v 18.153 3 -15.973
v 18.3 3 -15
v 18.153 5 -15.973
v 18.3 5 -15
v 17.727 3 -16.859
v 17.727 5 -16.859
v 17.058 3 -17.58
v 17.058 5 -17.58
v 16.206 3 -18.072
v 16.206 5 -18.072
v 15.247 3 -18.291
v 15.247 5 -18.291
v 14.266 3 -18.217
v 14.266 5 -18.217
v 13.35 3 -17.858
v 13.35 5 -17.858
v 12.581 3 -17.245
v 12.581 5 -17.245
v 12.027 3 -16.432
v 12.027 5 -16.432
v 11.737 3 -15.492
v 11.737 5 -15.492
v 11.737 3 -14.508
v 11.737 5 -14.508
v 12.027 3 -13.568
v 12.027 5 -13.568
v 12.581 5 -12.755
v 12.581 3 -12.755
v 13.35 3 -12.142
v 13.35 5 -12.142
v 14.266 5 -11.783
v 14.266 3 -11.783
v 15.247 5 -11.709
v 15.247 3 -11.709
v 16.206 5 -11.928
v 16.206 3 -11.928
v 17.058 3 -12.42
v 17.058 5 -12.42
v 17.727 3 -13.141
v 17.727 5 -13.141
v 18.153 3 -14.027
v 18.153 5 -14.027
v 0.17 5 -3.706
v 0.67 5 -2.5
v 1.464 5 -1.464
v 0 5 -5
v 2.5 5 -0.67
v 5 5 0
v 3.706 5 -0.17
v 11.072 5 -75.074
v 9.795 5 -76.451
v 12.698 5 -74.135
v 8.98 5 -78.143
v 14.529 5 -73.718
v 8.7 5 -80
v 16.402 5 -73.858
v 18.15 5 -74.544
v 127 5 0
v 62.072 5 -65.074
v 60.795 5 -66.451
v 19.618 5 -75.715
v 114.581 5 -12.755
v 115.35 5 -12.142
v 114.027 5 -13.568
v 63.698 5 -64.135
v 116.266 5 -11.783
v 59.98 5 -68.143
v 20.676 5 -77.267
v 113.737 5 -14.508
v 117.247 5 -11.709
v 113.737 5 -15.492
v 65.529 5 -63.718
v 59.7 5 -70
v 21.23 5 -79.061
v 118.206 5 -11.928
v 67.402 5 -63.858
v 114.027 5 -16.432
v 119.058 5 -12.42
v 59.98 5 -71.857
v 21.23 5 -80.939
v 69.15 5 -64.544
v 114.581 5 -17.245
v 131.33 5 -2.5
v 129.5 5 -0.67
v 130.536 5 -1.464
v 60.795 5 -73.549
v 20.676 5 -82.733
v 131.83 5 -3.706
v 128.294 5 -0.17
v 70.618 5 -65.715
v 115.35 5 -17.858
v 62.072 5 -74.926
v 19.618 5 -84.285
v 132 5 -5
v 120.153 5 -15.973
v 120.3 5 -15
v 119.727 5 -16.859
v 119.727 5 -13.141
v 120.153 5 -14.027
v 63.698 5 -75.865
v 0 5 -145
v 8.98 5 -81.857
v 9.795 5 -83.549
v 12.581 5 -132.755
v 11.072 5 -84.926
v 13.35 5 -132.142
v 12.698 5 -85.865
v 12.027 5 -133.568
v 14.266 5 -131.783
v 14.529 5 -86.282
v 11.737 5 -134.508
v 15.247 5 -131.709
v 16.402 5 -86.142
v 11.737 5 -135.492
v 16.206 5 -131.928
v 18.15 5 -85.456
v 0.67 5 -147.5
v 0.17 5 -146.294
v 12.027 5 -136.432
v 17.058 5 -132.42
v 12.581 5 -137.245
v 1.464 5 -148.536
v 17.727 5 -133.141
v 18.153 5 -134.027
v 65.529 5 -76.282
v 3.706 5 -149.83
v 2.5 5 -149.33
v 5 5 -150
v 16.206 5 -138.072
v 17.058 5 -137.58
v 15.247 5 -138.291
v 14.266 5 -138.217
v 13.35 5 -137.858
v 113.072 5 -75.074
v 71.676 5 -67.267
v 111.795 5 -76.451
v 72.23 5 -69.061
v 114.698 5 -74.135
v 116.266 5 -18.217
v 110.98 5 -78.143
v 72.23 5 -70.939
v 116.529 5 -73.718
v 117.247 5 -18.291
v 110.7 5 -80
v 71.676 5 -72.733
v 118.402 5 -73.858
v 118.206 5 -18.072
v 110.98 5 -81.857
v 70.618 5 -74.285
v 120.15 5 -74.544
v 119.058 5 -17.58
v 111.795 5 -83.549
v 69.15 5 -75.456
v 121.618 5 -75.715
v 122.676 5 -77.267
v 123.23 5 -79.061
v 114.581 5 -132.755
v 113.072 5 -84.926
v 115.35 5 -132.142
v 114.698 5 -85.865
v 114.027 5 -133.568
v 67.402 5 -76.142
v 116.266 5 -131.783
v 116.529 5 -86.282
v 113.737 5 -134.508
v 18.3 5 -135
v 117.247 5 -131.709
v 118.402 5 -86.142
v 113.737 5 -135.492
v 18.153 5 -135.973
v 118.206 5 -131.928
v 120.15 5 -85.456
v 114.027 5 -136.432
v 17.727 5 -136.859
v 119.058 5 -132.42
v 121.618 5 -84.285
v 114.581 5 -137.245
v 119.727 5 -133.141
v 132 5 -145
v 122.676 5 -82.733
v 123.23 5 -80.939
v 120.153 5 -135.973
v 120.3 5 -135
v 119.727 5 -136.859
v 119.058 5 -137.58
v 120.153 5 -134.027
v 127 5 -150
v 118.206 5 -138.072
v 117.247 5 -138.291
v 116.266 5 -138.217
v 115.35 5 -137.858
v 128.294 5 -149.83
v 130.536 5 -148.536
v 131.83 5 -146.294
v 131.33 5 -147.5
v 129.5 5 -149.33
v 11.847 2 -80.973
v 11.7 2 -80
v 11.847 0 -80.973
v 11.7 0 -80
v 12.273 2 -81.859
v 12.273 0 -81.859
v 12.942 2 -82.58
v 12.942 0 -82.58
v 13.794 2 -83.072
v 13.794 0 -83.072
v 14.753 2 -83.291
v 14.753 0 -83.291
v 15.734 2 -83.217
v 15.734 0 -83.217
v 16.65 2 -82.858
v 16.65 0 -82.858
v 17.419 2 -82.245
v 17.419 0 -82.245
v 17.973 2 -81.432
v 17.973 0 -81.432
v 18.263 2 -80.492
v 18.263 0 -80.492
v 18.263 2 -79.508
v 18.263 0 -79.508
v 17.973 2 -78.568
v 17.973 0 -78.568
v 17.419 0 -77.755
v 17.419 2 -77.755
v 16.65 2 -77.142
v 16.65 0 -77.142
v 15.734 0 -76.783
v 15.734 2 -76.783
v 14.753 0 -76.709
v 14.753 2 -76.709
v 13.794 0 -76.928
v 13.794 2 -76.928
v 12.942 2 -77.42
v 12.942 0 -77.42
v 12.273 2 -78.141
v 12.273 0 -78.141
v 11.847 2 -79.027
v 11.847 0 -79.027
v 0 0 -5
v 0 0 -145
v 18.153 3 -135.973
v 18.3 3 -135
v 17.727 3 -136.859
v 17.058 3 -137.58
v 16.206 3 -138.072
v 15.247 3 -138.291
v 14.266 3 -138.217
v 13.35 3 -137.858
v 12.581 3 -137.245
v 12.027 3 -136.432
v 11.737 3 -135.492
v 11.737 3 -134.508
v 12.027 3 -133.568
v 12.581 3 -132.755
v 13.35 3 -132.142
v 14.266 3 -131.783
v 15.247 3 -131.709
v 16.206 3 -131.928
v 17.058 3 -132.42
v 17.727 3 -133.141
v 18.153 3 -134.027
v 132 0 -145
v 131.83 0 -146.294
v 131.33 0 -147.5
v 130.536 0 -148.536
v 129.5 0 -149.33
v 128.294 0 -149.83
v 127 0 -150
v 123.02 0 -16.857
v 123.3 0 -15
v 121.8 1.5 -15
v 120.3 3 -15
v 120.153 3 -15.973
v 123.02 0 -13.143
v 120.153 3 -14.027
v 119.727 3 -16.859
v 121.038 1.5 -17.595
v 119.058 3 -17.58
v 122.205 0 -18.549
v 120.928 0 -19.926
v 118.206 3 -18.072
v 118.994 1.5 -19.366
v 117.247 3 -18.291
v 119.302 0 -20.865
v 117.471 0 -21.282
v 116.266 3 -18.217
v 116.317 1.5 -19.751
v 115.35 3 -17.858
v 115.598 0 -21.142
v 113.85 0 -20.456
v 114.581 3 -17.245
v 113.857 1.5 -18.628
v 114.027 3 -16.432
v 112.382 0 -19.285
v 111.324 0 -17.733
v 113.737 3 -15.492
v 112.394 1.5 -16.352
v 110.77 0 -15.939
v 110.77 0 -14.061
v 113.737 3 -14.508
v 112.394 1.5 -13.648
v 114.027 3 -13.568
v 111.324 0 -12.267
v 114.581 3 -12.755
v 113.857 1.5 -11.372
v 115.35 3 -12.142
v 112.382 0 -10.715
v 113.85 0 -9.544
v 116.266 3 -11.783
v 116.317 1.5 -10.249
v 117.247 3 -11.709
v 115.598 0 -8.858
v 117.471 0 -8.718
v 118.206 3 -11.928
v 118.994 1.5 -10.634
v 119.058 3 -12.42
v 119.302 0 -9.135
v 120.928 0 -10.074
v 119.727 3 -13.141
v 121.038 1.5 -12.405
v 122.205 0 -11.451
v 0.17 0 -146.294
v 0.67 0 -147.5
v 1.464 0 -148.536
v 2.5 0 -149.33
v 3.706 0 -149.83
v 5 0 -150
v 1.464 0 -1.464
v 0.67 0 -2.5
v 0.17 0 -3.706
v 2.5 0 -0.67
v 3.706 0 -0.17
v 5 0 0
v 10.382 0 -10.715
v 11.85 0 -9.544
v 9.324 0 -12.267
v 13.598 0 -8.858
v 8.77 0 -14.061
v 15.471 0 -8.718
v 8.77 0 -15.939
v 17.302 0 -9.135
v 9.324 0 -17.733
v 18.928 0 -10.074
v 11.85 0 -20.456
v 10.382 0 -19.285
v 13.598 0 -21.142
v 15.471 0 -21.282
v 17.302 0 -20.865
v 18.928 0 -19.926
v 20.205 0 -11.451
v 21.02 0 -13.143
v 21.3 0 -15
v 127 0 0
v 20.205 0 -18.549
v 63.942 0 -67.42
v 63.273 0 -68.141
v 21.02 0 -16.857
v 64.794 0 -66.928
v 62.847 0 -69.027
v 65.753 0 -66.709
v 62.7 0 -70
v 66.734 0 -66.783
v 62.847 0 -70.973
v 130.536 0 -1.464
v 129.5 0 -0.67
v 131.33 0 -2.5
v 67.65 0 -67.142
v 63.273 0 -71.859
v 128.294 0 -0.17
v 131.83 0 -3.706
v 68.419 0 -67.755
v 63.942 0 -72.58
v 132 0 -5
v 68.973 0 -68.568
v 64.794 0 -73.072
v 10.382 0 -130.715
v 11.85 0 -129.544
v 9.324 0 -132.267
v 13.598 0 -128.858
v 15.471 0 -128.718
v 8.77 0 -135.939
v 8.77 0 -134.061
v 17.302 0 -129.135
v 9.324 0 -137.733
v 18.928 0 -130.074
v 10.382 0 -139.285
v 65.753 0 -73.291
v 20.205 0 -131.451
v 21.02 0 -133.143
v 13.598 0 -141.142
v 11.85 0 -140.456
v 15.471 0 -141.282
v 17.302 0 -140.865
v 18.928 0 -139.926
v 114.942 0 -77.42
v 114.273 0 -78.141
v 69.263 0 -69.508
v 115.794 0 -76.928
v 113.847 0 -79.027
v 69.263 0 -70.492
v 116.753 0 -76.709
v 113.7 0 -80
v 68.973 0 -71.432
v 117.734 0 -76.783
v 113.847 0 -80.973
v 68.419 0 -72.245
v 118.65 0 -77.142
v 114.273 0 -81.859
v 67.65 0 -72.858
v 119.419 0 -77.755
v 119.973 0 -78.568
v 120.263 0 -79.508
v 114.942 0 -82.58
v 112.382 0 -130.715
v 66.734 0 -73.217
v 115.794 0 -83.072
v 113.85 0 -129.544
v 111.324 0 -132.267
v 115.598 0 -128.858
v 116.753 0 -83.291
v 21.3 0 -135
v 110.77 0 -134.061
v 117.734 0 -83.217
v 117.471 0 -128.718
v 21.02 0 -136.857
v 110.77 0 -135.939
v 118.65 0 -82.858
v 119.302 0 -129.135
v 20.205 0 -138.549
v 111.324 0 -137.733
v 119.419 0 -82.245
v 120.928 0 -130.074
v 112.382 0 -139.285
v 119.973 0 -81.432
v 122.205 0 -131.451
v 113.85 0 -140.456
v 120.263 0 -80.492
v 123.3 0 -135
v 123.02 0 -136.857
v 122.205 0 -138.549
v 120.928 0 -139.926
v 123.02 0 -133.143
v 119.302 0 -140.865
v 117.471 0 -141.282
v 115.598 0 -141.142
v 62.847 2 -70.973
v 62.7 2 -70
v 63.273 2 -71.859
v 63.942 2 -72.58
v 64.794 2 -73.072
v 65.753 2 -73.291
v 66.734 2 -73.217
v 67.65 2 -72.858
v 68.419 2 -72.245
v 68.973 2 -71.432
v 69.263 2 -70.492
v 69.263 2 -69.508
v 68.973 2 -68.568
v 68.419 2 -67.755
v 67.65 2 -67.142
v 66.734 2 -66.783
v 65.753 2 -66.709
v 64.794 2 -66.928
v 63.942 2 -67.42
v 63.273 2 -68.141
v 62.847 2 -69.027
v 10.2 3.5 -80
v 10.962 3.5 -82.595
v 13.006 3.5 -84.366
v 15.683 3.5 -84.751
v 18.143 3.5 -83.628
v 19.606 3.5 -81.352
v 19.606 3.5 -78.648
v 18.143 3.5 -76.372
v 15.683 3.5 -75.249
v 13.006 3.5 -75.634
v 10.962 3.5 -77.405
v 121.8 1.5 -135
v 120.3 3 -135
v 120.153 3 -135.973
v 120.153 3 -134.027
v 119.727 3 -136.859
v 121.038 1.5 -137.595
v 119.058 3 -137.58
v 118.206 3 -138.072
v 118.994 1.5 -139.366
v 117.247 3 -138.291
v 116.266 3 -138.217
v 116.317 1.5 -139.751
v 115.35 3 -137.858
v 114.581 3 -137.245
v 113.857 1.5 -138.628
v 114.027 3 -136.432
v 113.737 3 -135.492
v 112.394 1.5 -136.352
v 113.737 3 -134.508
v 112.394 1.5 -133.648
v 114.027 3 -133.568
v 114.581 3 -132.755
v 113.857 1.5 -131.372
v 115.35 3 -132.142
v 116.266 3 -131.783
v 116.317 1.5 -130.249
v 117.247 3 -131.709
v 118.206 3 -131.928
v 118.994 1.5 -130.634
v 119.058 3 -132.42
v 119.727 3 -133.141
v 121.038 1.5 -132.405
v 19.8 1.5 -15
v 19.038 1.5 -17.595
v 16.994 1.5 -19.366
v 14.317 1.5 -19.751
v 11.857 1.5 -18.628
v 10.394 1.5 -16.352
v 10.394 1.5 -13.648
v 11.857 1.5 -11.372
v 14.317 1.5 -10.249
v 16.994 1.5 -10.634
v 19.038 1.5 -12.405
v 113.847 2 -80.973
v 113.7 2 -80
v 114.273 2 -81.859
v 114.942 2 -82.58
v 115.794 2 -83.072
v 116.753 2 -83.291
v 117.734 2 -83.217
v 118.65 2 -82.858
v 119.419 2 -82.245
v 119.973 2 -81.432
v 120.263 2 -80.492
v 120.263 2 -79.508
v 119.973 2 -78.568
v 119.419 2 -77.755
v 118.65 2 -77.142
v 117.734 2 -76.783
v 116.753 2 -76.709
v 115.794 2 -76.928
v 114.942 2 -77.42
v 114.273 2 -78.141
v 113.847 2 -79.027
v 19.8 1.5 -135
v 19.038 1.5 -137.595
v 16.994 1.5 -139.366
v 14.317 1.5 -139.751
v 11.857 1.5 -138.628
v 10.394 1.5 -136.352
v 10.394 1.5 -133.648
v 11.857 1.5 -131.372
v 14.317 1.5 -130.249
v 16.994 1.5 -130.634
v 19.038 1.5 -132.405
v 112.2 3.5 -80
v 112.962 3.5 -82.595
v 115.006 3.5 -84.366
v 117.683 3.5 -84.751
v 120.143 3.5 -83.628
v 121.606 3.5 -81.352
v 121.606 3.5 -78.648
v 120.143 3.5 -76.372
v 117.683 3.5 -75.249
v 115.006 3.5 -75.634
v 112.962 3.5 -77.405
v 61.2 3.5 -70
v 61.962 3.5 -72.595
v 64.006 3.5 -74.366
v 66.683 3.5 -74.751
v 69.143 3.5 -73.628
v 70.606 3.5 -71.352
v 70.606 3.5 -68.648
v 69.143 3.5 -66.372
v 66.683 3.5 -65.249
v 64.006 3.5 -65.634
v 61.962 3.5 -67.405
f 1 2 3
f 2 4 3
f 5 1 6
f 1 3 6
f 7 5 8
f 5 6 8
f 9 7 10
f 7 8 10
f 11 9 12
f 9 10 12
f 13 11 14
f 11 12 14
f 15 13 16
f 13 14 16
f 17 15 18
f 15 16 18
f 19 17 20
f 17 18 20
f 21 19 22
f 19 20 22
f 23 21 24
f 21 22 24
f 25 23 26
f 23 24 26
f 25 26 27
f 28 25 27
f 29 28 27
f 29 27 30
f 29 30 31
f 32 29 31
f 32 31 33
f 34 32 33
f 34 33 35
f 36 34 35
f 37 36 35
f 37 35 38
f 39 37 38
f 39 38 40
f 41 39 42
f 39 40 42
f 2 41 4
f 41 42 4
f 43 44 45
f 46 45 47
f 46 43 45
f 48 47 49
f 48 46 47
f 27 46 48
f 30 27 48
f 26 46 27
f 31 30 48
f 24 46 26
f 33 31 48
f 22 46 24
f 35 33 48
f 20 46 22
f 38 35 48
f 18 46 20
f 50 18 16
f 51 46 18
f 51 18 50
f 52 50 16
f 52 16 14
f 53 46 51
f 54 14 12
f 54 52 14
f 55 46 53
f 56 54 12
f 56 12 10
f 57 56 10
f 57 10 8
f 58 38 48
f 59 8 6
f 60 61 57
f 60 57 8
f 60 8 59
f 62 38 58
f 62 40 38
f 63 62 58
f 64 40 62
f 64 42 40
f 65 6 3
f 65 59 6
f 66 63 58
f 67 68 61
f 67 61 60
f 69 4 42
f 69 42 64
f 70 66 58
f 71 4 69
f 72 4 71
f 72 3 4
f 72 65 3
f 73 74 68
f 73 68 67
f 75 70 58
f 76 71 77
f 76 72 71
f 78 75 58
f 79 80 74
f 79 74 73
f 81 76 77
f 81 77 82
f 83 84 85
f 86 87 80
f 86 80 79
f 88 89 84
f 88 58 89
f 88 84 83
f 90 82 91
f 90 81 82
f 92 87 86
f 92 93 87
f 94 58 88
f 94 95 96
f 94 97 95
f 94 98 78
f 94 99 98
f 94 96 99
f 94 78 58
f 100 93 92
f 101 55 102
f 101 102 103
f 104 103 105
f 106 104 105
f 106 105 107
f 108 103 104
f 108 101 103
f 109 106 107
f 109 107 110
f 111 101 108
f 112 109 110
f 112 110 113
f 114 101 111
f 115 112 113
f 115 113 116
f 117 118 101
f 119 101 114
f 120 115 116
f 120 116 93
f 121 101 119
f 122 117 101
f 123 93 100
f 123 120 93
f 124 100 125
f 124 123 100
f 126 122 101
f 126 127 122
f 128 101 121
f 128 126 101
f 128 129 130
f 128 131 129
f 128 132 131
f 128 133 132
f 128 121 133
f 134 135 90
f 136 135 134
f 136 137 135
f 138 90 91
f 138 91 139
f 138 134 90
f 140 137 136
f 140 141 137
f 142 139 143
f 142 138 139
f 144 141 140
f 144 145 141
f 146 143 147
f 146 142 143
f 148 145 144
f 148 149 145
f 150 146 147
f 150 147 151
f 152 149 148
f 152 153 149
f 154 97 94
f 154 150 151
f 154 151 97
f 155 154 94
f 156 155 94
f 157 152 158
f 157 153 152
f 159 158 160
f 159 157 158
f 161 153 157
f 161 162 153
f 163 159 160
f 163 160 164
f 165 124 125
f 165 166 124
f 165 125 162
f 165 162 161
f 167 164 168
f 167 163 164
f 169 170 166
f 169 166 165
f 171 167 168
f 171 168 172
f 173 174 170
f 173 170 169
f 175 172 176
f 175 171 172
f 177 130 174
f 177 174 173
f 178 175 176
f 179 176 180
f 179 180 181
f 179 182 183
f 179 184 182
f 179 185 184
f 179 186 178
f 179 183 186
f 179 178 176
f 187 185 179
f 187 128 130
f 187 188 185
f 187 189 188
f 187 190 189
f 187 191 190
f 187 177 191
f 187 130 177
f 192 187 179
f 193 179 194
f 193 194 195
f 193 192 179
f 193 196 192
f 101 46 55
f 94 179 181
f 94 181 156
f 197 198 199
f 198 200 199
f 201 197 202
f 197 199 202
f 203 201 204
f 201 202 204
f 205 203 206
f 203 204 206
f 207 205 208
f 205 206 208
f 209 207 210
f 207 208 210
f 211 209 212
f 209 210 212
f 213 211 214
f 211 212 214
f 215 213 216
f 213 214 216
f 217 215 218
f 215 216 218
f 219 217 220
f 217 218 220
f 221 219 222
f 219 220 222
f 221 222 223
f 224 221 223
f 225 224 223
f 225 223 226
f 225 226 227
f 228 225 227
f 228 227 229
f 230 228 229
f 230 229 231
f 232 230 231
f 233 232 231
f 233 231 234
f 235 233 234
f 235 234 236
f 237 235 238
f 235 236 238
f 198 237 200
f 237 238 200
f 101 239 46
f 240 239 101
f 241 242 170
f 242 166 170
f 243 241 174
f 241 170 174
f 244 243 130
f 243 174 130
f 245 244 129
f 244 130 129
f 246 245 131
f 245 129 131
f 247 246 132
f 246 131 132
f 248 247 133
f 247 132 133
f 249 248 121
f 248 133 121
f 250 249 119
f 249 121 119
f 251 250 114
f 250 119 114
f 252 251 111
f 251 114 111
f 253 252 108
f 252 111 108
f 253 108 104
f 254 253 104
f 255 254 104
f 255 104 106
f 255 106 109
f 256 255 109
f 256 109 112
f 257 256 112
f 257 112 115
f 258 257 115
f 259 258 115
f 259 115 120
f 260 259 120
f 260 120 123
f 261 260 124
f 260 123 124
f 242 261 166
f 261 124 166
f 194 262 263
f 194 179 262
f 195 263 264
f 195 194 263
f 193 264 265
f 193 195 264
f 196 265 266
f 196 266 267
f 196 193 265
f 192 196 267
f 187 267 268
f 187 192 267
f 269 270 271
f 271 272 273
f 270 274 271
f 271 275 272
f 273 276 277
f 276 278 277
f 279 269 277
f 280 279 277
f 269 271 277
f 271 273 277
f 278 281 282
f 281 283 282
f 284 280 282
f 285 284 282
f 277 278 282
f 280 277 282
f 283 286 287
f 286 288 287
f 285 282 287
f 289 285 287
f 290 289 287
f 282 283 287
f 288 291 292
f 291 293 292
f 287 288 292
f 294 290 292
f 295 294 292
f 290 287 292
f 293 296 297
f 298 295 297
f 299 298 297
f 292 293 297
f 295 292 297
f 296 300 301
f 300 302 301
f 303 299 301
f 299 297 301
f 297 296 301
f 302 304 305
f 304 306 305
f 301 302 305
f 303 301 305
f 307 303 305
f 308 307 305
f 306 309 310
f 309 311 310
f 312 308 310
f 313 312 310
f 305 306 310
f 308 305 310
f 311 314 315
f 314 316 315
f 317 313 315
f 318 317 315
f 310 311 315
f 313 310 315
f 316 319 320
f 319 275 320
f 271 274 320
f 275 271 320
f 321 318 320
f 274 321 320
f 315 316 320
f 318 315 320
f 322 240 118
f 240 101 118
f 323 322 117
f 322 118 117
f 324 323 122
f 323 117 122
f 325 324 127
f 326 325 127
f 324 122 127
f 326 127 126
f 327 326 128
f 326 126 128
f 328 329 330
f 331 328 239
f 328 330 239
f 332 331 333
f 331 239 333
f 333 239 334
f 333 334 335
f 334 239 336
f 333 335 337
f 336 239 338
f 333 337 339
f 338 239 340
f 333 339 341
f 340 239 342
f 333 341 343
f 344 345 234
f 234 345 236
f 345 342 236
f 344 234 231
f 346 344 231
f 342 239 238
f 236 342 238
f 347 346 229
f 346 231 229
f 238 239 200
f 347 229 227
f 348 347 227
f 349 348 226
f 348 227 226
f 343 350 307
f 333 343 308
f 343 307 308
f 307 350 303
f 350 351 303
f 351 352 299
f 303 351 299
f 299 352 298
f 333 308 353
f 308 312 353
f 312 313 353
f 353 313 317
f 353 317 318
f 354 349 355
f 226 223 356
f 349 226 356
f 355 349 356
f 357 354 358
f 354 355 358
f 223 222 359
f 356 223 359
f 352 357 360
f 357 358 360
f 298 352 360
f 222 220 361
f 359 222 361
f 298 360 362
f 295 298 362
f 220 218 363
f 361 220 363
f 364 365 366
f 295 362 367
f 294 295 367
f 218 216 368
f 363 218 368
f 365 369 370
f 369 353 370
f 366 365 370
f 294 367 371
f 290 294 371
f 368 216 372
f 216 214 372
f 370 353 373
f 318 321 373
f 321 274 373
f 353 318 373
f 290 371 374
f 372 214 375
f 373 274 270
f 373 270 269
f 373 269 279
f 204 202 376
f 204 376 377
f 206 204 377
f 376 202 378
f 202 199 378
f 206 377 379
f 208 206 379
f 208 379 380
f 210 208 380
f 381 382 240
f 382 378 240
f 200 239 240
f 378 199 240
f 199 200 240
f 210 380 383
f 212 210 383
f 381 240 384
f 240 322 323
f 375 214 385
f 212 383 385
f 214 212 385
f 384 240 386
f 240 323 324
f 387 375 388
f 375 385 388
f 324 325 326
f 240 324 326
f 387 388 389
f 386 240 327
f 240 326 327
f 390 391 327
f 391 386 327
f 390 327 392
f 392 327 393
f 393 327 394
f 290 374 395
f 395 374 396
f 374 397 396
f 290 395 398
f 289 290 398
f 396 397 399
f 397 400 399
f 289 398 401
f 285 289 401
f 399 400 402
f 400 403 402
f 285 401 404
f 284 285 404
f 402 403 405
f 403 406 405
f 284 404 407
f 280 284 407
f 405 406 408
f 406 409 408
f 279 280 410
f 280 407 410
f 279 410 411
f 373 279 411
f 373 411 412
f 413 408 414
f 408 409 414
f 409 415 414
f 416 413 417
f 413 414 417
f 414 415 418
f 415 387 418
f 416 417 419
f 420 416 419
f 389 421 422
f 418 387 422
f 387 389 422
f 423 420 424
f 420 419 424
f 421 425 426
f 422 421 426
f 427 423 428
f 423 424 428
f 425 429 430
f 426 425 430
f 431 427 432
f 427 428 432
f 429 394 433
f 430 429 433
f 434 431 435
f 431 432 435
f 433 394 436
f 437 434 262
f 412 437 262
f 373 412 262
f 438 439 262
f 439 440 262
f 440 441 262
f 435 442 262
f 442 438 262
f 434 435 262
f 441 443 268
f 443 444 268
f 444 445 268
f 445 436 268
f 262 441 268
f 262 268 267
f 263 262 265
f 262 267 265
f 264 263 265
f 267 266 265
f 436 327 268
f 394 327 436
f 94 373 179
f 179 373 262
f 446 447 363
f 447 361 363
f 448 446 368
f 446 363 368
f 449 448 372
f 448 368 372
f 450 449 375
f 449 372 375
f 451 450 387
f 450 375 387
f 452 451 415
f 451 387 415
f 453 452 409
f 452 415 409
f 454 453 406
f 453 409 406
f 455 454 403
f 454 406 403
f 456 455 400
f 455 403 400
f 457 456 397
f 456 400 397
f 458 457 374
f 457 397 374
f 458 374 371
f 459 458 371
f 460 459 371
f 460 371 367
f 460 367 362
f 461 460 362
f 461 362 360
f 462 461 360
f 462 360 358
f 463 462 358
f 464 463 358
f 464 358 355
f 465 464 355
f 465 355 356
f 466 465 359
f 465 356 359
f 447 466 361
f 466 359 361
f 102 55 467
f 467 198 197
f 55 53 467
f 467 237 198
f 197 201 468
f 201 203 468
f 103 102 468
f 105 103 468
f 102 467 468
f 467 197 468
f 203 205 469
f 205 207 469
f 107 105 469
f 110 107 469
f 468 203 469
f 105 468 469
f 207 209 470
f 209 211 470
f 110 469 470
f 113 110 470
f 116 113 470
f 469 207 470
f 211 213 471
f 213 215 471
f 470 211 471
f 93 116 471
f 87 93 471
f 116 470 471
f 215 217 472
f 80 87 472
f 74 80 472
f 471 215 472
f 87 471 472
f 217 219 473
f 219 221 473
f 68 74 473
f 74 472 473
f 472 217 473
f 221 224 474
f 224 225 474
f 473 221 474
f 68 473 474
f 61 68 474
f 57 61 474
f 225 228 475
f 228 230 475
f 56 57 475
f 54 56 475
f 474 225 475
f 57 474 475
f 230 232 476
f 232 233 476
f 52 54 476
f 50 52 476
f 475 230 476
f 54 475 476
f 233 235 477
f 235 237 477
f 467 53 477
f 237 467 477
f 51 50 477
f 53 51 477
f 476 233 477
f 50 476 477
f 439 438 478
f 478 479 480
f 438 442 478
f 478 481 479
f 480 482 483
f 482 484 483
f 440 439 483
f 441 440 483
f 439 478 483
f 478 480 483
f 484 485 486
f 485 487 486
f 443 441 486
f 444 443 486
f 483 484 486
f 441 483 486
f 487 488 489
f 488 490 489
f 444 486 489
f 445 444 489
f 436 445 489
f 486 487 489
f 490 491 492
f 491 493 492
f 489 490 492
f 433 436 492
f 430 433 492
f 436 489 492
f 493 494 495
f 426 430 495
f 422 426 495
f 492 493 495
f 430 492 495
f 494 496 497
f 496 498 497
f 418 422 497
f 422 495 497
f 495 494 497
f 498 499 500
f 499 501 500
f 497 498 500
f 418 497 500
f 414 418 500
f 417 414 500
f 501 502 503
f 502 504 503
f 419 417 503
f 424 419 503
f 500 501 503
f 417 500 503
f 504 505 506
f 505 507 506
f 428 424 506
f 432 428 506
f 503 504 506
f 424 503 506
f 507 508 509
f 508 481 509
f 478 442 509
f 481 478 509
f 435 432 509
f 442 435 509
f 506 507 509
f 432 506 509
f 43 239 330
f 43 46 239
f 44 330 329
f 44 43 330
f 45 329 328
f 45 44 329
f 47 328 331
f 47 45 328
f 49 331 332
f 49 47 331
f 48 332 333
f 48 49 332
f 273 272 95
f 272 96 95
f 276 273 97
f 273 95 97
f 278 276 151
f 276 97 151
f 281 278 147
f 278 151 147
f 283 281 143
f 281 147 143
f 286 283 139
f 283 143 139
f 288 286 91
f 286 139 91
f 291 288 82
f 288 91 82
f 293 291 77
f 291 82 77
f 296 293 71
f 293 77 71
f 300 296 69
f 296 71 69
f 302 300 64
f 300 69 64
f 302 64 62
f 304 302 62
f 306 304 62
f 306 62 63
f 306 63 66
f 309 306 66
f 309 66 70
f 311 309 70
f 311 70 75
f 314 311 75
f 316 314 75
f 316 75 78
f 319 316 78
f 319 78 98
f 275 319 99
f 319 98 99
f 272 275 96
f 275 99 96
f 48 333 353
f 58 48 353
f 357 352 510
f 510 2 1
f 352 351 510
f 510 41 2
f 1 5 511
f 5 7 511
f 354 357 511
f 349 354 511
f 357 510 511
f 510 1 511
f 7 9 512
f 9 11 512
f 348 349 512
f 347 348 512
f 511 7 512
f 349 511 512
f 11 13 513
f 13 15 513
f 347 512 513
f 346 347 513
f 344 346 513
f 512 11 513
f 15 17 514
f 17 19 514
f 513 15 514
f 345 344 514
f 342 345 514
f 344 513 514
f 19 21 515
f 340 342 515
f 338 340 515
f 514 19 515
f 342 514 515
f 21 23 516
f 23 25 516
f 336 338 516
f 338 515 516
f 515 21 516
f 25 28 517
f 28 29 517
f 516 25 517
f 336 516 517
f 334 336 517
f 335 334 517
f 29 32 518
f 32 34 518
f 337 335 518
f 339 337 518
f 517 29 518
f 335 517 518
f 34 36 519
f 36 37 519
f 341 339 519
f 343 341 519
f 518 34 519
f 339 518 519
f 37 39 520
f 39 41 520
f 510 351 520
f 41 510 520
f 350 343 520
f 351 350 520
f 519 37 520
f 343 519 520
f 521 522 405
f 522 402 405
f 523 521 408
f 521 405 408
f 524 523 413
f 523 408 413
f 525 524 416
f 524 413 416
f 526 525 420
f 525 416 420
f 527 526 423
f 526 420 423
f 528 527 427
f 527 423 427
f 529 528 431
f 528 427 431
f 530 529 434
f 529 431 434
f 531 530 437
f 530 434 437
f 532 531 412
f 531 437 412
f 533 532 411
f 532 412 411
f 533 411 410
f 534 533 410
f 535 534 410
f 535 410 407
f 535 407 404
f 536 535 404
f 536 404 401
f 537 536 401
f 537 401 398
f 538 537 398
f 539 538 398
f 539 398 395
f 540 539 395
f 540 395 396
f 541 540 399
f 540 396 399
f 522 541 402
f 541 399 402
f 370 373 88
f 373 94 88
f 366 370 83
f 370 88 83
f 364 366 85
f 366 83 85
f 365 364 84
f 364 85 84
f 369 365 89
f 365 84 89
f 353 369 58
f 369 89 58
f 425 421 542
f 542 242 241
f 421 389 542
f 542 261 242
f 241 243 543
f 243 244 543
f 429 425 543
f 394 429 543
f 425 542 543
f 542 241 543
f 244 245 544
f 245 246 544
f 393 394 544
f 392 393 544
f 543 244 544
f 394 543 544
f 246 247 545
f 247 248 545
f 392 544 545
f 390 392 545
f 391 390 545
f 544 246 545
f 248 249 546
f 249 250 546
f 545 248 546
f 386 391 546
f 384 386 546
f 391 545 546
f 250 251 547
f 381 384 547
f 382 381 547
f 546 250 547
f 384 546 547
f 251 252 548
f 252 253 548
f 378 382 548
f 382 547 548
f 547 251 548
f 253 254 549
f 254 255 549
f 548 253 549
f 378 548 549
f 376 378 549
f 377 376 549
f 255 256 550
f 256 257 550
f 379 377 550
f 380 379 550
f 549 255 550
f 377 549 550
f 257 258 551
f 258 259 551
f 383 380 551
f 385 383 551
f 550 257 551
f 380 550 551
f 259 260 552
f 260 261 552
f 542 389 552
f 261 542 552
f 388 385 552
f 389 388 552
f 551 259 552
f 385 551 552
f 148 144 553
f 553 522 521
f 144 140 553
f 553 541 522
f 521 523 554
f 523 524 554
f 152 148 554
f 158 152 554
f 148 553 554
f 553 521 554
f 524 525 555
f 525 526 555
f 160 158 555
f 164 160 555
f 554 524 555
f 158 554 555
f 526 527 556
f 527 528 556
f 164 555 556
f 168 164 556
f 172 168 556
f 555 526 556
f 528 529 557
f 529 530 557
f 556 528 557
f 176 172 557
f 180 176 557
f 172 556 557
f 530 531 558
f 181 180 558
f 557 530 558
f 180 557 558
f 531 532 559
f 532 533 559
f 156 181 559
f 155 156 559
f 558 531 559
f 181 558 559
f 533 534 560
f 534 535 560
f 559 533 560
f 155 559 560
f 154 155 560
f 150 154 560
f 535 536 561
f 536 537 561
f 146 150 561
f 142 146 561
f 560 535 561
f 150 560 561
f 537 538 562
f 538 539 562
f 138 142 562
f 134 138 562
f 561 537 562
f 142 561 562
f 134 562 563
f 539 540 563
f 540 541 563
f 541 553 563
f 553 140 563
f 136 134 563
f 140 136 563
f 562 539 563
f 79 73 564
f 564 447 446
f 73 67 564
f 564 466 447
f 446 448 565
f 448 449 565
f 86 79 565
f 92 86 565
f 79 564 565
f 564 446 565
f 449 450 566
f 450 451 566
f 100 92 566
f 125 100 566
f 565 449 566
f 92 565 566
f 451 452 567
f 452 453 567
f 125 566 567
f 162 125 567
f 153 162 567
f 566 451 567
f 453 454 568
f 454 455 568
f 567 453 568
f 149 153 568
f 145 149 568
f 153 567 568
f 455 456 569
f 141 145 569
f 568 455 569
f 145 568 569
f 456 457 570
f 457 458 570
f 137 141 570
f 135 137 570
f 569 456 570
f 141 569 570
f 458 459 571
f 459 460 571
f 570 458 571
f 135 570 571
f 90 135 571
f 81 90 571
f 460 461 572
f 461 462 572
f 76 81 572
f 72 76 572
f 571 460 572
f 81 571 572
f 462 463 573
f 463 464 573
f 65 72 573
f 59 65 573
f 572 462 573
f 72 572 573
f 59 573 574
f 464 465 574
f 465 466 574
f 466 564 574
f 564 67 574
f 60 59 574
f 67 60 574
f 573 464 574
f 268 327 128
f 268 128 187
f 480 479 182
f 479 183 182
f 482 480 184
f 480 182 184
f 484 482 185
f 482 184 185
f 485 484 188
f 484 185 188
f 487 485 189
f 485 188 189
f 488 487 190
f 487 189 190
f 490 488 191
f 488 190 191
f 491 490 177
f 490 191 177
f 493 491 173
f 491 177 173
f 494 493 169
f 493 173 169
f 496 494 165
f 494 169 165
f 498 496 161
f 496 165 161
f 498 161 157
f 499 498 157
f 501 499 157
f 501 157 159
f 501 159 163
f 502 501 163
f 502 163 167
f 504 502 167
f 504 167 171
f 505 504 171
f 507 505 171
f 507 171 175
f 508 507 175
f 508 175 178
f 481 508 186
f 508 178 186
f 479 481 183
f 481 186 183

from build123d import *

# Parameters (mm, degrees)
SKETCH1_W                                       = 132
SKETCH1_H                                       = 150
BOSS_EXTRUDE1_DEPTH                             = 5
CSK_FOR_M6_FLAT_HEAD_MACHINE_SCREW1_D           = 6.6
CSK_FOR_M6_FLAT_HEAD_MACHINE_SCREW1_DEPTH       = 10
CSK_FOR_M6_FLAT_HEAD_MACHINE_SCREW1_CSINK_D     = 12.6
CSK_FOR_M6_FLAT_HEAD_MACHINE_SCREW1_CSINK_ANGLE = 90
CSK_FOR_M6_FLAT_HEAD_MACHINE_SCREW1_TIP         = 1.982840043
CSK_FOR_M6_FLAT_HEAD_MACHINE_SCREW2_D           = 6.6
CSK_FOR_M6_FLAT_HEAD_MACHINE_SCREW2_DEPTH       = 10
CSK_FOR_M6_FLAT_HEAD_MACHINE_SCREW2_CSINK_D     = 12.6
CSK_FOR_M6_FLAT_HEAD_MACHINE_SCREW2_CSINK_ANGLE = 90
CSK_FOR_M6_FLAT_HEAD_MACHINE_SCREW2_TIP         = 1.982840043
FILLET1_R                                       = 5


with BuildPart() as part:
    # Sketch1 → Boss-Extrude1 (new body)
    with BuildSketch(Plane(origin=(0, 0, 0), x_dir=(1, 0, 0), z_dir=(0, 1, 0))):
        with Locations((66, 75)):
            Rectangle(SKETCH1_W, SKETCH1_H)
    extrude(amount=BOSS_EXTRUDE1_DEPTH)

    # CSK for M6 Flat Head Machine Screw1
    with Locations(Plane(origin=(0, 5, 0), x_dir=(1, 0, 0), z_dir=(0, 1, 0))):
        with Locations((15, 80), (66, 70), (117, 80)):
            CounterSinkHole(CSK_FOR_M6_FLAT_HEAD_MACHINE_SCREW1_D / 2, CSK_FOR_M6_FLAT_HEAD_MACHINE_SCREW1_CSINK_D / 2, depth=CSK_FOR_M6_FLAT_HEAD_MACHINE_SCREW1_DEPTH, counter_sink_angle=CSK_FOR_M6_FLAT_HEAD_MACHINE_SCREW1_CSINK_ANGLE)
            with Locations((0, 0, -(CSK_FOR_M6_FLAT_HEAD_MACHINE_SCREW1_DEPTH + CSK_FOR_M6_FLAT_HEAD_MACHINE_SCREW1_TIP / 2))):  # 118° drill point
                Cone(0, CSK_FOR_M6_FLAT_HEAD_MACHINE_SCREW1_D / 2, CSK_FOR_M6_FLAT_HEAD_MACHINE_SCREW1_TIP, mode=Mode.SUBTRACT)

    # CSK for M6 Flat Head Machine Screw2
    with Locations(Plane(origin=(0, 0, 0), x_dir=(-1, 0, 0), z_dir=(0, -1, 0))):
        with Locations((-15, 15), (-117, 15), (-117, 135), (-15, 135)):
            CounterSinkHole(CSK_FOR_M6_FLAT_HEAD_MACHINE_SCREW2_D / 2, CSK_FOR_M6_FLAT_HEAD_MACHINE_SCREW2_CSINK_D / 2, depth=CSK_FOR_M6_FLAT_HEAD_MACHINE_SCREW2_DEPTH, counter_sink_angle=CSK_FOR_M6_FLAT_HEAD_MACHINE_SCREW2_CSINK_ANGLE)
            with Locations((0, 0, -(CSK_FOR_M6_FLAT_HEAD_MACHINE_SCREW2_DEPTH + CSK_FOR_M6_FLAT_HEAD_MACHINE_SCREW2_TIP / 2))):  # 118° drill point
                Cone(0, CSK_FOR_M6_FLAT_HEAD_MACHINE_SCREW2_D / 2, CSK_FOR_M6_FLAT_HEAD_MACHINE_SCREW2_TIP, mode=Mode.SUBTRACT)

    # Fillet1
    fillet1_edges = [part.edges().sort_by_distance(p)[0] for p in [
        (0, 2.5, -150),
        (132, 2.5, -150),
        (132, 2.5, 0),
        (0, 2.5, 0),
    ]]
    fillet(fillet1_edges, radius=FILLET1_R)


solid = part.part
